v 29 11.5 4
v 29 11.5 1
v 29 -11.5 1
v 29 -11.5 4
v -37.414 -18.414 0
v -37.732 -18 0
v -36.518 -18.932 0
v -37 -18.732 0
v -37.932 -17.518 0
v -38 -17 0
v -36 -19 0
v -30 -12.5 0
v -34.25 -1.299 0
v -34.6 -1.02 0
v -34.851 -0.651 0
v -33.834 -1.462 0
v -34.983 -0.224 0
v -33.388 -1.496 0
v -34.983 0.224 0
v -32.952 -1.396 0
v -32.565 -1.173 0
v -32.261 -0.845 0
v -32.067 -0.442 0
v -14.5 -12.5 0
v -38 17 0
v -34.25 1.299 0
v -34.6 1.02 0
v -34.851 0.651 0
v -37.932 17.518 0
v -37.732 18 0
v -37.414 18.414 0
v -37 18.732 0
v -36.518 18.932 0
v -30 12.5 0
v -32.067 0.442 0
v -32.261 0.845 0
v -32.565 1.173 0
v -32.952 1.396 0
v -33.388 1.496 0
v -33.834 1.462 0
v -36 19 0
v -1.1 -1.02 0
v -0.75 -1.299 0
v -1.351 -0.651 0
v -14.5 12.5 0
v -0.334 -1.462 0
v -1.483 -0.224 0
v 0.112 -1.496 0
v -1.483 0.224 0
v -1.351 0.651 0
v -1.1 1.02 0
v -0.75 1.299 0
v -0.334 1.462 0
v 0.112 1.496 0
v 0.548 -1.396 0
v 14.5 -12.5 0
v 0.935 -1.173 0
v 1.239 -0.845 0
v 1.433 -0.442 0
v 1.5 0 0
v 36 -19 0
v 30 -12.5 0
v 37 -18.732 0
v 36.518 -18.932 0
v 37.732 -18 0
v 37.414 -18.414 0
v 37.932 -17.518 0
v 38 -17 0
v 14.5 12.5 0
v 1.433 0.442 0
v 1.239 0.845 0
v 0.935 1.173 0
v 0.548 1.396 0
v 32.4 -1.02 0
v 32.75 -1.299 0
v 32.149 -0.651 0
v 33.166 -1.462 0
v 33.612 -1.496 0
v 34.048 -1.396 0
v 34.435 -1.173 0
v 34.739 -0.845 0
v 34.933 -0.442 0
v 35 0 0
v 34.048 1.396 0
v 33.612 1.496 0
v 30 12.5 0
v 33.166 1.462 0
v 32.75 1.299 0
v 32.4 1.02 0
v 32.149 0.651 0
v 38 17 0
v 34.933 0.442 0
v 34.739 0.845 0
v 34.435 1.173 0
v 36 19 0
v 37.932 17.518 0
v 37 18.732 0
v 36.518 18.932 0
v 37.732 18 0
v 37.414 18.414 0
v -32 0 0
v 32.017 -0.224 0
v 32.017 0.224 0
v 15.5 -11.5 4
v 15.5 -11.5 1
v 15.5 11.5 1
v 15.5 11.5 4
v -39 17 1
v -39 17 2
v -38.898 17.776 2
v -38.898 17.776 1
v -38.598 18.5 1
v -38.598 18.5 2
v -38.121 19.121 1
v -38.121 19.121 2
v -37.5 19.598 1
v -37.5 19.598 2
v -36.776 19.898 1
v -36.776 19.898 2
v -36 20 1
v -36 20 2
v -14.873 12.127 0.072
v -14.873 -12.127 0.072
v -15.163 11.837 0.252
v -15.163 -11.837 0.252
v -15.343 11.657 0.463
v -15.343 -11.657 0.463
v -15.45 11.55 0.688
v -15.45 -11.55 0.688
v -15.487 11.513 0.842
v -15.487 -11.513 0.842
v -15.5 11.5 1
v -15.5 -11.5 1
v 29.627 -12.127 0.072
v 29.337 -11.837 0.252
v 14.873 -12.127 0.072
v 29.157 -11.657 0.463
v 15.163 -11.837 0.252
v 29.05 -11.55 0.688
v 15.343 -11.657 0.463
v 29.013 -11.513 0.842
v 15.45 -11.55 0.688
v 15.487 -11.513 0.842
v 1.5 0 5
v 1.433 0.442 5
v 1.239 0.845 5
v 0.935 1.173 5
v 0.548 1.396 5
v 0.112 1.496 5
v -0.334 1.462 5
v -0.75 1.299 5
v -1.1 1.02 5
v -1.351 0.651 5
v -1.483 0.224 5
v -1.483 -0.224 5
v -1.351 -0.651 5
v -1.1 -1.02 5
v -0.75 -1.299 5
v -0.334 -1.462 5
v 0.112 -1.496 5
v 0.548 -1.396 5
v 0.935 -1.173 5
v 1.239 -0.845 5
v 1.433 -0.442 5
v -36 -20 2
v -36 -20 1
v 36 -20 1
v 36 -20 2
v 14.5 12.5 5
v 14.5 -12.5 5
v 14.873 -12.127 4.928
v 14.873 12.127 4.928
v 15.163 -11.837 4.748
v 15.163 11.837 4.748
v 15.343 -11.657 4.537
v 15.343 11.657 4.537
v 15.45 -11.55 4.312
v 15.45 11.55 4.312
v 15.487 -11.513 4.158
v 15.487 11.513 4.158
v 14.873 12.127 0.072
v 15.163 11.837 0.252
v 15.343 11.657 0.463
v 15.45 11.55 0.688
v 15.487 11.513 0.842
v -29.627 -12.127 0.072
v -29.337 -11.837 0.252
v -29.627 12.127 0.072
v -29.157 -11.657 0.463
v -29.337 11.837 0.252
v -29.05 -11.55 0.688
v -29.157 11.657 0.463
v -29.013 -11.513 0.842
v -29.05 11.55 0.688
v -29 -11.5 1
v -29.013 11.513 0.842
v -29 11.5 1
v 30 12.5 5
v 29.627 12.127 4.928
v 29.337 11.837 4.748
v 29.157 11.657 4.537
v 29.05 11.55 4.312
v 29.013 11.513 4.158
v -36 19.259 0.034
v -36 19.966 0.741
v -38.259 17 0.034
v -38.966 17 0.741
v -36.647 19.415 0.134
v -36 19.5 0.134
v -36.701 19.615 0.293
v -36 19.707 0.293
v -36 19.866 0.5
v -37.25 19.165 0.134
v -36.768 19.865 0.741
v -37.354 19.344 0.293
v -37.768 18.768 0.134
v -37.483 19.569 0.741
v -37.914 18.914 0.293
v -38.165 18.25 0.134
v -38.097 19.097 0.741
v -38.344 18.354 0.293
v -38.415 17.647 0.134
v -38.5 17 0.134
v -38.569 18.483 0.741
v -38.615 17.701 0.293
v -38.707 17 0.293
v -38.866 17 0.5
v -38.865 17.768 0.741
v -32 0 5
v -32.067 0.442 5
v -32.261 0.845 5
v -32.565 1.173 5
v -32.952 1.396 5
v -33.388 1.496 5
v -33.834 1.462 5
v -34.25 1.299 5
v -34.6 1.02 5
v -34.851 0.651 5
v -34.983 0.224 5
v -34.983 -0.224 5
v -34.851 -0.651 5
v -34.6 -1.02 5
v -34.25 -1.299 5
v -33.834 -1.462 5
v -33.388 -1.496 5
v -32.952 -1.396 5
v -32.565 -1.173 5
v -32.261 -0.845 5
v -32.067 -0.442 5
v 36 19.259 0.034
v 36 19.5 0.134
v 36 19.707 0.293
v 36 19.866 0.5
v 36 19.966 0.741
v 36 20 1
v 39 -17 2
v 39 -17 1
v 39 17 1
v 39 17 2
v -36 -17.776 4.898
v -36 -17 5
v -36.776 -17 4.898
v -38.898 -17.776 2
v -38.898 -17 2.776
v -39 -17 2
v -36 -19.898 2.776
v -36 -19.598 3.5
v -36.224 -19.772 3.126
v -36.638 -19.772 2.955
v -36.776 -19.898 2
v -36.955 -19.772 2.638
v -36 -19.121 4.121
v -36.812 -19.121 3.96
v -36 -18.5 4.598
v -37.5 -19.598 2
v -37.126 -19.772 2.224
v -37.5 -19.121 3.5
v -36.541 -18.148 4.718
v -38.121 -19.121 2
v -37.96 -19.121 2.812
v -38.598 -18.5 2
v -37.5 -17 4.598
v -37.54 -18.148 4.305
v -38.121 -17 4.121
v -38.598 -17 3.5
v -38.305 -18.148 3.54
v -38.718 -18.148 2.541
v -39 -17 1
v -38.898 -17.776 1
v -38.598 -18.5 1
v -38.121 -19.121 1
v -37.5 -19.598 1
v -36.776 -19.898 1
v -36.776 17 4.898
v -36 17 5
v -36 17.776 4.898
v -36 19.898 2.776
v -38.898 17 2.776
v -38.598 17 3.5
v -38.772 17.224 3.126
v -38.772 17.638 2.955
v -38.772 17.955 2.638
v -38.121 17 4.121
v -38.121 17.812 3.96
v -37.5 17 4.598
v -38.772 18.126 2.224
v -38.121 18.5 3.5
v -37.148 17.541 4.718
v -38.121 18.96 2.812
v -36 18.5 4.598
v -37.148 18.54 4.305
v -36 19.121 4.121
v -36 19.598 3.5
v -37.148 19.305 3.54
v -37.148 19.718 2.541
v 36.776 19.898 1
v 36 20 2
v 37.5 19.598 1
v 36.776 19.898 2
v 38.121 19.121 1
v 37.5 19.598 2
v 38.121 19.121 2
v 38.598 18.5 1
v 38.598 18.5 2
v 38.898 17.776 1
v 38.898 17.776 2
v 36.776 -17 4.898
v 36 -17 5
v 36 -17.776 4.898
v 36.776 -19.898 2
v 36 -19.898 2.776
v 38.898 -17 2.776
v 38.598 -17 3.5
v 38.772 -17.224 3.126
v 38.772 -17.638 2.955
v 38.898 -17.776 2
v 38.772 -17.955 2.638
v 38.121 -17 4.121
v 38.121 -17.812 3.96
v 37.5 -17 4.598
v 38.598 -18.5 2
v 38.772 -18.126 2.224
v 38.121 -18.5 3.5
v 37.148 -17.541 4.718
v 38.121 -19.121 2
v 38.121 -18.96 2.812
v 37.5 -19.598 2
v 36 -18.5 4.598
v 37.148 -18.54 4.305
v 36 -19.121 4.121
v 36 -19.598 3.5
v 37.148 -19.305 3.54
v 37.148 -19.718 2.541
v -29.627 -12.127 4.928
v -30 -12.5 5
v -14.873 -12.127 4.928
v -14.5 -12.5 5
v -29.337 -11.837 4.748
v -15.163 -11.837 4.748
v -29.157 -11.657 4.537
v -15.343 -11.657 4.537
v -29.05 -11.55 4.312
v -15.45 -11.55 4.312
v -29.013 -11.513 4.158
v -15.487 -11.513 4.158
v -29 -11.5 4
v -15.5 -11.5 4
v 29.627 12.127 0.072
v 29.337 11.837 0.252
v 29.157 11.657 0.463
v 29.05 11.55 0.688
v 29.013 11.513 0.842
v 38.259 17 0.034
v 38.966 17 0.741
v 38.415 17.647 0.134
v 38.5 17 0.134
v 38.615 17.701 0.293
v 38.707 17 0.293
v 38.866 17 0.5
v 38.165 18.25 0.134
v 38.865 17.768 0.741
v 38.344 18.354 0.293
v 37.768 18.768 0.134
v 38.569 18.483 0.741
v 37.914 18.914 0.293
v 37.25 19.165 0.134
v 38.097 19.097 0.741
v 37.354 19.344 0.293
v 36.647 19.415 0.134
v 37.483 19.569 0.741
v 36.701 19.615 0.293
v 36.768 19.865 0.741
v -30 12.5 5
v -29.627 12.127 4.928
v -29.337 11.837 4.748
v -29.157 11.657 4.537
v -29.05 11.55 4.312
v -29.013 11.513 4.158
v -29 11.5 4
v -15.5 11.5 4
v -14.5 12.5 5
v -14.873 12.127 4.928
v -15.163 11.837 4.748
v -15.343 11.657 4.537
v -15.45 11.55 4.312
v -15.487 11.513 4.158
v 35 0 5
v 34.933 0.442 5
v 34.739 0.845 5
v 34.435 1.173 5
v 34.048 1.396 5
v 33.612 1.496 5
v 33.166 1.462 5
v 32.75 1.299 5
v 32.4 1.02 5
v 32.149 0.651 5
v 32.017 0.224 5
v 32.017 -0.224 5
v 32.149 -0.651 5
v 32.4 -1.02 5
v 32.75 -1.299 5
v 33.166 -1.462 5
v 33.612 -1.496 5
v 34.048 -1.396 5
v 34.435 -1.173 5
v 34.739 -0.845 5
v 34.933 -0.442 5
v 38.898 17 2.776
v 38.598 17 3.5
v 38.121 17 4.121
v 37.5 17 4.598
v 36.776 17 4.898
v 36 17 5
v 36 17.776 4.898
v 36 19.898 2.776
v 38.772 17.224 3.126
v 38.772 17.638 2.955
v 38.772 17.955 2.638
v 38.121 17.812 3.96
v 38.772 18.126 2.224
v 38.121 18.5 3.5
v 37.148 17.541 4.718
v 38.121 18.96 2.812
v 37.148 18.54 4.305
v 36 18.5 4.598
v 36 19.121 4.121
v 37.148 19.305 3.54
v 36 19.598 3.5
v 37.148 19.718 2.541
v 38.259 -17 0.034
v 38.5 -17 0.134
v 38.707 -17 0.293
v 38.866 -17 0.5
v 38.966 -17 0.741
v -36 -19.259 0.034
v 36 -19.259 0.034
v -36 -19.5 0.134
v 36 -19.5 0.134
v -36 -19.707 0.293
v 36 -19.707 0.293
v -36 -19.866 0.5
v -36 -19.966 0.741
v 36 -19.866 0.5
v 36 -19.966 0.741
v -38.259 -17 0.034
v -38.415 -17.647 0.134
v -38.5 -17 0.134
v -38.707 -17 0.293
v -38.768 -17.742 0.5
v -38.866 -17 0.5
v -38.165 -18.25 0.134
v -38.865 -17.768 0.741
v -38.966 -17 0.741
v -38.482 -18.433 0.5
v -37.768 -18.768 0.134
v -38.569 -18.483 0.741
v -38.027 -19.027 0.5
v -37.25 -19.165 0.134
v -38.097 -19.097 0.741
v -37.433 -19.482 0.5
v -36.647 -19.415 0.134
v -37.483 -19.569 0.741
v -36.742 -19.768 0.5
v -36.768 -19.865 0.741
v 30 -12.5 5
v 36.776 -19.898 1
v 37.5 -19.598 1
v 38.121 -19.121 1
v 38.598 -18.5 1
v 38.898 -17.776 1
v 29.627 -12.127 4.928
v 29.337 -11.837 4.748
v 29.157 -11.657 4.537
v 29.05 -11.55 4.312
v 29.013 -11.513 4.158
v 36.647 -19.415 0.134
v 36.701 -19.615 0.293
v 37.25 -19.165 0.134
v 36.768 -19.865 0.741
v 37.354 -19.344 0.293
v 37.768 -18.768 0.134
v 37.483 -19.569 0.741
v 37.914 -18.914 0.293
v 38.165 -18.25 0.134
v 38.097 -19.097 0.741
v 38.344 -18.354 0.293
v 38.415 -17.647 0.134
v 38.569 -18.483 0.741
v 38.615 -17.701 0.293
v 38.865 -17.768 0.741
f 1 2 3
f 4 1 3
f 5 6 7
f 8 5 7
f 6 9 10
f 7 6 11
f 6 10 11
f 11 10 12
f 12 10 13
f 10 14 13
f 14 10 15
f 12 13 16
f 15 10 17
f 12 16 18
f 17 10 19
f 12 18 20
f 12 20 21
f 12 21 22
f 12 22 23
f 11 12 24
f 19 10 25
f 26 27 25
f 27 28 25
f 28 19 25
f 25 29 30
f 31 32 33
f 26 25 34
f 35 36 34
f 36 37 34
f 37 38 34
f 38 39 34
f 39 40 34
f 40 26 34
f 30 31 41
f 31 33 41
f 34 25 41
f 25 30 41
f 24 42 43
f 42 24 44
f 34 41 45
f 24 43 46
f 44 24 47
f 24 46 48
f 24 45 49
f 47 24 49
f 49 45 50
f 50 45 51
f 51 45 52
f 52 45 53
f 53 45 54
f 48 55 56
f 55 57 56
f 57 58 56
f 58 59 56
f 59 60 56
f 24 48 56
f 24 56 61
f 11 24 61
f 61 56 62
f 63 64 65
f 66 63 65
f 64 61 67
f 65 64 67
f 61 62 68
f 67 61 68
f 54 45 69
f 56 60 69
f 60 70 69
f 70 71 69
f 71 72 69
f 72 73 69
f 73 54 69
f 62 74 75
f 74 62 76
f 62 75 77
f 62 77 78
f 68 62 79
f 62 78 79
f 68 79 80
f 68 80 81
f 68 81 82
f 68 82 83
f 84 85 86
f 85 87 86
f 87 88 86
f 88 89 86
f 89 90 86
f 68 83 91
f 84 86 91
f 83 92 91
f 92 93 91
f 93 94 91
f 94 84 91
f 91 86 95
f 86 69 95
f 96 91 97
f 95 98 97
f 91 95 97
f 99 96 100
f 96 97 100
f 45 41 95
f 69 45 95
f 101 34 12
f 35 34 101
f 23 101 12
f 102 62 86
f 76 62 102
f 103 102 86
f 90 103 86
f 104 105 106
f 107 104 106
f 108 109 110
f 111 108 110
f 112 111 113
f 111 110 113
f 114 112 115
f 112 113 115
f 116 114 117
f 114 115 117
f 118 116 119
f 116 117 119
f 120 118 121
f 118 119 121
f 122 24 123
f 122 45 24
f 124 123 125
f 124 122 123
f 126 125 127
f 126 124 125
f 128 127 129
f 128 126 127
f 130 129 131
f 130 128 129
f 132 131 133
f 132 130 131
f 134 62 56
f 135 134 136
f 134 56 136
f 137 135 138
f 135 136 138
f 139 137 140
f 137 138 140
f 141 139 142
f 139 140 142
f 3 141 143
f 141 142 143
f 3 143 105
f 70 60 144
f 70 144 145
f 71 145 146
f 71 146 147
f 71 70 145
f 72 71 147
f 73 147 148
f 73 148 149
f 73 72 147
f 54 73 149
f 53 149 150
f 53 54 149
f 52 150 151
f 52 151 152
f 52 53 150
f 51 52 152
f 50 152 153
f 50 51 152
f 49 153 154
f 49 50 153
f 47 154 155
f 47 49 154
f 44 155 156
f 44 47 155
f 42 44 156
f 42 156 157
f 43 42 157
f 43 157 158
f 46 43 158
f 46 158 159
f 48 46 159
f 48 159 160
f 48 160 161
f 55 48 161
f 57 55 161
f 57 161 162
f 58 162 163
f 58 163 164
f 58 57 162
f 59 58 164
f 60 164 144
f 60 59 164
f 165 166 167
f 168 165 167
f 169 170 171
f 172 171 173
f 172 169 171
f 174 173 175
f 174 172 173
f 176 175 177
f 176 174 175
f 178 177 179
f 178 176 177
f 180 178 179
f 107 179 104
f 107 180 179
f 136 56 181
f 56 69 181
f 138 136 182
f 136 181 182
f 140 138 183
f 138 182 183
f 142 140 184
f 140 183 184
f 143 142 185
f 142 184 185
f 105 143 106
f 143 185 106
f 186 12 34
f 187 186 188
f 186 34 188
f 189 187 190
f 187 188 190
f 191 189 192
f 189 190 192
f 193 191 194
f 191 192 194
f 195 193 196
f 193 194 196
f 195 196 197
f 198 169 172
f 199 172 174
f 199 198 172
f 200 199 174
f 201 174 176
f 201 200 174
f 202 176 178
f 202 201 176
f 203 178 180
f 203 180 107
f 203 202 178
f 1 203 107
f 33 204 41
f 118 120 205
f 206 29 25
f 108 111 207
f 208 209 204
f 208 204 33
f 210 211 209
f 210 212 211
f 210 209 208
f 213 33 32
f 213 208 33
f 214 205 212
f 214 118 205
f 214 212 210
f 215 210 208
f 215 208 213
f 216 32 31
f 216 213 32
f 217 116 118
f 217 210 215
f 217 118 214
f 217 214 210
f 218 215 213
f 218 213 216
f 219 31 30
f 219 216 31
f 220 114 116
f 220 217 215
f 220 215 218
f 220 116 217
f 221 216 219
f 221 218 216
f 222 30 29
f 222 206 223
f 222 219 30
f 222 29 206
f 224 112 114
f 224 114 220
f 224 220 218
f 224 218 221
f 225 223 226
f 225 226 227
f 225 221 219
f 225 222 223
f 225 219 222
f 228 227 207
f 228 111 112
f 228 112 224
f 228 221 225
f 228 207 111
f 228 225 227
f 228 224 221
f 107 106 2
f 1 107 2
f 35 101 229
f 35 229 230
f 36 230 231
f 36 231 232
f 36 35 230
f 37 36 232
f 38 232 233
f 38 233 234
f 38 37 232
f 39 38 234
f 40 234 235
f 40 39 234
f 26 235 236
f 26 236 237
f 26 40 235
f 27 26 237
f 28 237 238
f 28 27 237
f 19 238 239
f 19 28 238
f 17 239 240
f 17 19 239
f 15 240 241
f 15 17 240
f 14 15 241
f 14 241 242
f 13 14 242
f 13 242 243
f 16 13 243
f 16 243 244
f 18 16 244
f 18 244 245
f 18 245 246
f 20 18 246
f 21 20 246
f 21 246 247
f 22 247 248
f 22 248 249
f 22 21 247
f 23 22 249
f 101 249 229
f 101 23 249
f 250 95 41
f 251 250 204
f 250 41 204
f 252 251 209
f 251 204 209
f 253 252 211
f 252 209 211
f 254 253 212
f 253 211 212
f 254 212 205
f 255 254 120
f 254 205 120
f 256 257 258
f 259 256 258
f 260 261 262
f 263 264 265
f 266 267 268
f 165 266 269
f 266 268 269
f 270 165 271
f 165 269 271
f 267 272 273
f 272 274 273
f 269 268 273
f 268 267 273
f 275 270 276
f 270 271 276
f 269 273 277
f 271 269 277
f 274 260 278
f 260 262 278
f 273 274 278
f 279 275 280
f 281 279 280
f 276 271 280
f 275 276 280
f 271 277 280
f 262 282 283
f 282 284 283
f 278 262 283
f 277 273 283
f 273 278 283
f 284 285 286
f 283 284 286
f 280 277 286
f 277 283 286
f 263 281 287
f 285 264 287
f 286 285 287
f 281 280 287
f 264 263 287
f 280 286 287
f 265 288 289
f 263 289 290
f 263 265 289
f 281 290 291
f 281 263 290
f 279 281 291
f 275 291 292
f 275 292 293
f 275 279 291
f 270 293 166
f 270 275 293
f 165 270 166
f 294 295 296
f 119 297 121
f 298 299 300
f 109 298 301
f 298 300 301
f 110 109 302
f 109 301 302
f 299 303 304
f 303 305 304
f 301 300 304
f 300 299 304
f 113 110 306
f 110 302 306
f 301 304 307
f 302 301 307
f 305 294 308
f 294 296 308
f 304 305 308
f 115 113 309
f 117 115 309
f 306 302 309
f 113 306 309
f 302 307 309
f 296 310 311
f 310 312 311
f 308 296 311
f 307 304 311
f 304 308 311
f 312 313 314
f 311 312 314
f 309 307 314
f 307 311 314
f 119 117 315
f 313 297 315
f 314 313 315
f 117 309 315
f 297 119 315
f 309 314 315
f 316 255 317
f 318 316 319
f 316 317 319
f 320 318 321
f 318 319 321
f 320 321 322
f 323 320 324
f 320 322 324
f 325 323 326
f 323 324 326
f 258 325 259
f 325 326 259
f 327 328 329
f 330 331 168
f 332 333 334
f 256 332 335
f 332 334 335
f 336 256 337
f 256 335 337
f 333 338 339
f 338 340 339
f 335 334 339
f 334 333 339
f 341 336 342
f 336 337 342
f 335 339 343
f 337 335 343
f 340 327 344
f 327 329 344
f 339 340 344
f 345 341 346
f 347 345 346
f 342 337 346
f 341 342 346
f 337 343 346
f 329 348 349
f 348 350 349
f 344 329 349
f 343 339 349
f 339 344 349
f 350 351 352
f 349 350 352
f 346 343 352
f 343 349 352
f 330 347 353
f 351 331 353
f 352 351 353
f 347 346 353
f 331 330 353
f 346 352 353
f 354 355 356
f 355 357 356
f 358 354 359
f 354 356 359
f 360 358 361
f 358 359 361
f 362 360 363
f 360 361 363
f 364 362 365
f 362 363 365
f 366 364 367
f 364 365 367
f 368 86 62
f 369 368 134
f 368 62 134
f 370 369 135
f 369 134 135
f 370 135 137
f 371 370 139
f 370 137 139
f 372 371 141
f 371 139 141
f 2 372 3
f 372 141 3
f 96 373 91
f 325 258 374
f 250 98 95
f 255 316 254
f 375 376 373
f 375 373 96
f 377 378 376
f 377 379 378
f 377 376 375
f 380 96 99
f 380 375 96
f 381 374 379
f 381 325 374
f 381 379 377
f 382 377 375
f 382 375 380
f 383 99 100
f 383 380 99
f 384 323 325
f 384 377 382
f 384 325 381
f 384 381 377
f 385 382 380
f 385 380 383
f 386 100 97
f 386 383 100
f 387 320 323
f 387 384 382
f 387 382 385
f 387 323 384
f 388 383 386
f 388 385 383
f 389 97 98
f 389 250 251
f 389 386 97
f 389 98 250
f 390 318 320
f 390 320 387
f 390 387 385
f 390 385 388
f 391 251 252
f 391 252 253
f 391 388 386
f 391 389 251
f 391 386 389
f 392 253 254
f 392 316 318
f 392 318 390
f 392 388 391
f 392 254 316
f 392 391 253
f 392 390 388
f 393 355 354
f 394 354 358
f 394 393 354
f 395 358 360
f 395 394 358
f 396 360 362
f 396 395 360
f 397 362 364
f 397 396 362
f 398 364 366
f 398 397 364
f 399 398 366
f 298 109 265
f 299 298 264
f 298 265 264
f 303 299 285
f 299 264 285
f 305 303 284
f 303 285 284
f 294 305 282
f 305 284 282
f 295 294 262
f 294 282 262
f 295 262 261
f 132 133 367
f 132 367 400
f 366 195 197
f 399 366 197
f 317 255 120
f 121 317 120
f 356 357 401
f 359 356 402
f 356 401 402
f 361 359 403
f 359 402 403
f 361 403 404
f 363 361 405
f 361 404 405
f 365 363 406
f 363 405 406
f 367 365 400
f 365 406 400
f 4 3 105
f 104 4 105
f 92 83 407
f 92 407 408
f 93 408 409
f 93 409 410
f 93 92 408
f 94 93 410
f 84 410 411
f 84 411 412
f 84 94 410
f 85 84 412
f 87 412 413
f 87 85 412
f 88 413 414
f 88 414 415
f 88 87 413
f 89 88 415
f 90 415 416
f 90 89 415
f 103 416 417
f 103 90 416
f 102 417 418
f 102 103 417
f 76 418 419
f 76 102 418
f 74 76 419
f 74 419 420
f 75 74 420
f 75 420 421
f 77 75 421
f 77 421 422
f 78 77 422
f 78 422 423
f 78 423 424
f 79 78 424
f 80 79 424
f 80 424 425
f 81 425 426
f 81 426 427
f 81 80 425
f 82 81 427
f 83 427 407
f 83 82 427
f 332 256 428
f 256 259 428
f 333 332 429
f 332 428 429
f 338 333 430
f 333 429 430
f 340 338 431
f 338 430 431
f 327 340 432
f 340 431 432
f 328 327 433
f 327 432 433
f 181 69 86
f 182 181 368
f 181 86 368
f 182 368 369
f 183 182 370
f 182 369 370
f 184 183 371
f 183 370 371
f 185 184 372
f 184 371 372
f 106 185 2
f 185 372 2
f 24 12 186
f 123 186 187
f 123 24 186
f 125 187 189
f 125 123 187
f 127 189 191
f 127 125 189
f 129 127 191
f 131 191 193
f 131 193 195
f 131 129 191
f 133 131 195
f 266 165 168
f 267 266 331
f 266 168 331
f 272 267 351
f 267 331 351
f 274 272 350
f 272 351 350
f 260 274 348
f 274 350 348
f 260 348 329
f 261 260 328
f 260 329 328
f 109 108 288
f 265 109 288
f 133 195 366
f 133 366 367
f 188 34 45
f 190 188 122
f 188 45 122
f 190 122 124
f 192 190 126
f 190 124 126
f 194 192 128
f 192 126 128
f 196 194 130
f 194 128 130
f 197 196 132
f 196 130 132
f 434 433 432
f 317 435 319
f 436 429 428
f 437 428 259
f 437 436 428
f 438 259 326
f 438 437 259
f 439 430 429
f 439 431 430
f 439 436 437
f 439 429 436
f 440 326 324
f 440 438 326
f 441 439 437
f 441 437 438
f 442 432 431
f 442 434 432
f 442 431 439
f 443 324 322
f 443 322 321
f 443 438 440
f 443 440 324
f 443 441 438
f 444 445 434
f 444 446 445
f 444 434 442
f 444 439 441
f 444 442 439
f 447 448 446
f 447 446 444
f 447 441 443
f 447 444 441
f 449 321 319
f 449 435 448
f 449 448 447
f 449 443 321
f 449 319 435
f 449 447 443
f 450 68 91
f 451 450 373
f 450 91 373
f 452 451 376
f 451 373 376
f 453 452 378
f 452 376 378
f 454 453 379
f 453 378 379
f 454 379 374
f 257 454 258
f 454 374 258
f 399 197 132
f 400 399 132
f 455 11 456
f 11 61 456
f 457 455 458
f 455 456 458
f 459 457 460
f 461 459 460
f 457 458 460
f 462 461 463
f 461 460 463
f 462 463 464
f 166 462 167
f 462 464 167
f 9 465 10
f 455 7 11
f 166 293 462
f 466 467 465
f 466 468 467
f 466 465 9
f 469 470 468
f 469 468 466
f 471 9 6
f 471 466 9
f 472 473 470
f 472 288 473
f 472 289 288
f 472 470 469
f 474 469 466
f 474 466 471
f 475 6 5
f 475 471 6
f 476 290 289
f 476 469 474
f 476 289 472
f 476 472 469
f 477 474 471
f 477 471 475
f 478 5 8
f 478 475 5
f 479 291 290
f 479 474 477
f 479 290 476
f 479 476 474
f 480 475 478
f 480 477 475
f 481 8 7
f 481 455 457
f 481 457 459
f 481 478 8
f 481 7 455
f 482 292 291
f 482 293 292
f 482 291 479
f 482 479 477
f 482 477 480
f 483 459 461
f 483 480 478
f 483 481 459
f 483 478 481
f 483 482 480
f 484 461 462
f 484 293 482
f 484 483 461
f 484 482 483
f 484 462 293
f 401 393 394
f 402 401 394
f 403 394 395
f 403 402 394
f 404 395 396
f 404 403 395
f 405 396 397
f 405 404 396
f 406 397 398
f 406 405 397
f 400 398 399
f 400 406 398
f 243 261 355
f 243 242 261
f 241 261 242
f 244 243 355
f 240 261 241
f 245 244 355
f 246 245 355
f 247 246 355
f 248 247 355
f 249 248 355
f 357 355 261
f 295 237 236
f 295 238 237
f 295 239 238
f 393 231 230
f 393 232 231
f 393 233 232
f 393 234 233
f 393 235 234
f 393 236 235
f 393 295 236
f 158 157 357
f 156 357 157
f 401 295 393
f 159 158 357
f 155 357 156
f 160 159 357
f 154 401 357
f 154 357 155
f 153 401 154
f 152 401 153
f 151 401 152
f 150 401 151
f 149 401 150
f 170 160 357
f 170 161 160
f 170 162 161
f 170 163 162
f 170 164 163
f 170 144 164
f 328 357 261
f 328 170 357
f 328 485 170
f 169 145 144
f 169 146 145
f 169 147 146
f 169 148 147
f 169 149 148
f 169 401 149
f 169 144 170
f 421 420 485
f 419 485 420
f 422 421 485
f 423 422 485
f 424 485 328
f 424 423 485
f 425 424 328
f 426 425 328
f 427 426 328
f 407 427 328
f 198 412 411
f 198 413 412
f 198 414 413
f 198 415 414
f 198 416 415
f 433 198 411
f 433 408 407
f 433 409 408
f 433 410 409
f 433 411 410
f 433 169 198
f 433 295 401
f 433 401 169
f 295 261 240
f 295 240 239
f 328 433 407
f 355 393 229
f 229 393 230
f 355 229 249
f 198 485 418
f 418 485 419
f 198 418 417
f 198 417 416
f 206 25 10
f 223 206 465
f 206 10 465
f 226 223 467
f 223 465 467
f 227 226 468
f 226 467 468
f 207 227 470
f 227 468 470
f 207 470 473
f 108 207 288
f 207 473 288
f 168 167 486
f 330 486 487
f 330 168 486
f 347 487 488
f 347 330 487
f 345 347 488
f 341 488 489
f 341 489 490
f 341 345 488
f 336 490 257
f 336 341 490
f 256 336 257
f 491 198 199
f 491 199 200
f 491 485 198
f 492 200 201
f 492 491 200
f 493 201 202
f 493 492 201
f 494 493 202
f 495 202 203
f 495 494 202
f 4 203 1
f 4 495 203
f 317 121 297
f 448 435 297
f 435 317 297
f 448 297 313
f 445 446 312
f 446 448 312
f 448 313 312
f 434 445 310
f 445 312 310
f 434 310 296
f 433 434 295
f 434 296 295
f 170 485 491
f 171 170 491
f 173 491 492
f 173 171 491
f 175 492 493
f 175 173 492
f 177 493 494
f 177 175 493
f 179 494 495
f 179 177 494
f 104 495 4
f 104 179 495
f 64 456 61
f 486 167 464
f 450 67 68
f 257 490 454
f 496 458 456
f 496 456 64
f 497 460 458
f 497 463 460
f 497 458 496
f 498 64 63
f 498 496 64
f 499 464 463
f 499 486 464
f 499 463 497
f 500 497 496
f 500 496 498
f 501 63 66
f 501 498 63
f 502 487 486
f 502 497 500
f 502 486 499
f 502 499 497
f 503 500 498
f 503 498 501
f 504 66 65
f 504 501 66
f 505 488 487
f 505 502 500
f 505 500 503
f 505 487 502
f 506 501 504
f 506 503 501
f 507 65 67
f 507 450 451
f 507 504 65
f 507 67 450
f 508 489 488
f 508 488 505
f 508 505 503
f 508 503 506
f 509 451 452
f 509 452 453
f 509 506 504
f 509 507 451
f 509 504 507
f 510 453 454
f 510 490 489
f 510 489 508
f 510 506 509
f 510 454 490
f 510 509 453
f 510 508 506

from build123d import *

# Parameters (mm, degrees)
F0_R     = 1.5
F0_W     = 13.5
F0_H     = 23
F1_DEPTH = 5
F2_R     = 3
F3_R     = 1
F4_R     = 1


with BuildPart() as f1:
    # F0 (on Top) → F1 (new body)
    with BuildSketch(Plane.XY):
        Polygon((0, 20), (-39, 20), (-39, -20), (39, -20), (39, 0), (39, 20), align=None)
        with Locations((-33.5, 0)):
            Circle(F0_R, mode=Mode.SUBTRACT)
        with Locations((-22.25, 0)):
            Rectangle(F0_W, F0_H, mode=Mode.SUBTRACT)
        Circle(F0_R, mode=Mode.SUBTRACT)
        Polygon((15.5, 11.5), (29, 11.5), (29, 0), (29, -11.5), (15.5, -11.5), align=None, mode=Mode.SUBTRACT)
        with Locations((33.5, 0)):
            Circle(F0_R, mode=Mode.SUBTRACT)
    extrude(amount=F1_DEPTH)

    # F2
    f2_edges = [f1.edges().sort_by_distance(p)[0] for p in [
        (0, 20, 5),
        (-39, 0, 5),
        (0, -20, 5),
        (39, 0, 5),
        (-39, -20, 2.5),
        (-39, 20, 2.5),
        (39, 20, 2.5),
        (39, -20, 2.5),
    ]]
    fillet(f2_edges, radius=F2_R)

    # F3
    f3_edges = [f1.edges().sort_by_distance(p)[0] for p in [
        (0, -20, 0),
    ]]
    fillet(f3_edges, radius=F3_R)

    # F4
    f4_edges = [f1.edges().sort_by_distance(p)[0] for p in [
        (-22.25, -11.5, 5),
        (-15.5, 0, 5),
        (-22.25, 11.5, 5),
        (-29, 0, 5),
        (15.5, 0, 5),
        (22.25, 11.5, 5),
        (29, 0, 5),
        (22.25, -11.5, 5),
        (-29, 0, 0),
        (-15.5, 0, 0),
        (-22.25, 11.5, 0),
        (-22.25, -11.5, 0),
        (22.25, -11.5, 0),
        (29, 0, 0),
        (22.25, 11.5, 0),
        (15.5, 0, 0),
    ]]
    fillet(f4_edges, radius=F4_R)


solid = f1.part
